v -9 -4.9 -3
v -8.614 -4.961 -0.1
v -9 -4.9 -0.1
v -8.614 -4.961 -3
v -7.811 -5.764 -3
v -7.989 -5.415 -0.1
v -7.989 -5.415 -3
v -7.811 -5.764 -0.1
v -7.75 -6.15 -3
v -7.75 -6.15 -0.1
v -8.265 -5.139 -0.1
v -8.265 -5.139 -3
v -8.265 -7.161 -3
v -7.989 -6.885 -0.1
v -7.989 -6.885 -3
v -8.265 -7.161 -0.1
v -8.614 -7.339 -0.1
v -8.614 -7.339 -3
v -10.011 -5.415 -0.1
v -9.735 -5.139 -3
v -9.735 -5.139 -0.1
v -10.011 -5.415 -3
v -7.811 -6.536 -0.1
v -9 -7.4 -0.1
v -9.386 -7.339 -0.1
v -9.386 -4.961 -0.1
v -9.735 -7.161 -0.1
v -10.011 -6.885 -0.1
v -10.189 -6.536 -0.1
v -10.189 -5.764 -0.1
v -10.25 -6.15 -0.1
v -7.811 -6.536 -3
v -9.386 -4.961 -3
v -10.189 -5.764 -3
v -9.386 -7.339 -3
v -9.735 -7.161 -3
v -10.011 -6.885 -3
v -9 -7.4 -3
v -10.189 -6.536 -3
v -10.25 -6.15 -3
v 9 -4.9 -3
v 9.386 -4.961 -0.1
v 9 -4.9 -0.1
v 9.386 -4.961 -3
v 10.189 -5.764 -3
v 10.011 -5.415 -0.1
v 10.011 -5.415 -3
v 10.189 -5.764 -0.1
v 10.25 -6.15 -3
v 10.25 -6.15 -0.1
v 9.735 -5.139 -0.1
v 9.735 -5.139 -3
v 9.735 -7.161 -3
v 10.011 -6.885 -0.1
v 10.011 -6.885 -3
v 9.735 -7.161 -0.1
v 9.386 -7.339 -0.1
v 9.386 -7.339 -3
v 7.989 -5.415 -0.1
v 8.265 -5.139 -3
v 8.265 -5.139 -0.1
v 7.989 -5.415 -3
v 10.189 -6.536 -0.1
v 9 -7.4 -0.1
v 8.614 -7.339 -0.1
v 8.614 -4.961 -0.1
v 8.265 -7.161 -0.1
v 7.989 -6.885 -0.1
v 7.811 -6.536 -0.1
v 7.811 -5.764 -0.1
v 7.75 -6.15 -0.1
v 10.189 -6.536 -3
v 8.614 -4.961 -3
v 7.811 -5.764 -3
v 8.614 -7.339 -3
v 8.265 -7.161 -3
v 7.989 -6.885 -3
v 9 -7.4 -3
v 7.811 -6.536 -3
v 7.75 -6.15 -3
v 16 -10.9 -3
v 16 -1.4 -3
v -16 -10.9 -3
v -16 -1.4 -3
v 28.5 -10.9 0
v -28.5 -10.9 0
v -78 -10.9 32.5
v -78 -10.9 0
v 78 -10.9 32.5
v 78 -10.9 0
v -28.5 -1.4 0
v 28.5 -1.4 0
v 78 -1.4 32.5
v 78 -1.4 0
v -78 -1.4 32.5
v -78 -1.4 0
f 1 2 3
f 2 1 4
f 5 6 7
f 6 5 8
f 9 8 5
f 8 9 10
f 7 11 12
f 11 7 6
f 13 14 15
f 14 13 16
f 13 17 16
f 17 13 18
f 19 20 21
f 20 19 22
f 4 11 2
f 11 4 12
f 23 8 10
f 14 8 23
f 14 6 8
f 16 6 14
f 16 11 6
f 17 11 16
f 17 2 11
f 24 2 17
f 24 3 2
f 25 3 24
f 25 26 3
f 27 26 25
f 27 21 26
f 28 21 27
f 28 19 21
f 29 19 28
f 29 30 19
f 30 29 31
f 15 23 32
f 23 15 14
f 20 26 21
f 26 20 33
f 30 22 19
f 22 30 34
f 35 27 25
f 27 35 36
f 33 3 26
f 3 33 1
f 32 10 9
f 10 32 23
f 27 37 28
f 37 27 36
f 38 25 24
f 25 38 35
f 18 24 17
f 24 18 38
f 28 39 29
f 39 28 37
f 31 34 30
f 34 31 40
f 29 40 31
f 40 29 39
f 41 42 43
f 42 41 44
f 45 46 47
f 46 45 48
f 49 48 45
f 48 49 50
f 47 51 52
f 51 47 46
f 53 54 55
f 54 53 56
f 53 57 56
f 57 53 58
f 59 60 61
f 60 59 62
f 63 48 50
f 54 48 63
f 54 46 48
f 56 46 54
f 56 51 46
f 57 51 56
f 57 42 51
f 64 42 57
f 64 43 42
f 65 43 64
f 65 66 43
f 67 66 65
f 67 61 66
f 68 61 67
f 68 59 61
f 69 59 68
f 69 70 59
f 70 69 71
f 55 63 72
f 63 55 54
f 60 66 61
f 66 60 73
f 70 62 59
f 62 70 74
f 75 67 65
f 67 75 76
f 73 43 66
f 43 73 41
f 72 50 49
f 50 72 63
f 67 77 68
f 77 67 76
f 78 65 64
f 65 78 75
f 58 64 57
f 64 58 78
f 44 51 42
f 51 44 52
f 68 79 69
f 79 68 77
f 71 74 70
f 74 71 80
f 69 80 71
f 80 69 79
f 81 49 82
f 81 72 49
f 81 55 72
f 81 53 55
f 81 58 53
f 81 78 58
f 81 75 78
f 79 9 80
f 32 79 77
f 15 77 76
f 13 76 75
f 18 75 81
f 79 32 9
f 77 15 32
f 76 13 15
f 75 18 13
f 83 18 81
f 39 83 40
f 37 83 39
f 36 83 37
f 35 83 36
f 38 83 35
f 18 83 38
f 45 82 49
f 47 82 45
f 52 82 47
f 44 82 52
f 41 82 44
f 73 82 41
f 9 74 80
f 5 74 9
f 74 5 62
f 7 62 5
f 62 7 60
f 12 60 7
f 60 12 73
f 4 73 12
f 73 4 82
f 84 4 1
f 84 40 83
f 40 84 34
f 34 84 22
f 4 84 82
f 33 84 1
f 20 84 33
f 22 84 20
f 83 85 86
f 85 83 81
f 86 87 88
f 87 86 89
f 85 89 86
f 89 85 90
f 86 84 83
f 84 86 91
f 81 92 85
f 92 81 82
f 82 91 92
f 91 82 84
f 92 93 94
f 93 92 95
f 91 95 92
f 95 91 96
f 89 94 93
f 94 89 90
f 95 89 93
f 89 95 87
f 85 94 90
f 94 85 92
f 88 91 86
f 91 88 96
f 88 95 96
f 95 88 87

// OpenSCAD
// file: smooth_model.scad
// Smoothness Parameters - Modeling
// Developed by: Michael McCool
// Copyright 2016 Intel Corporation
// License: CC-BY.  See LICENSE.md

sm_base = 5;  // base smoothness value for modeling
// file: zr300_params.scad
// Parameters for Intel(R) RealSense(TM) ZR300 Depth Camera
// Developed by: Michael McCool
// Copyright 2016 Intel Corporation
// License: CC-BY.  See LICENSE.md

// CAMERA PARAMETERS

// basic overall size of camera
zr300_x = 156;
zr300_y = 9.5;
zr300_z = 32.5;

// base of camera
zr300_base_x1 = 32;
zr300_base_x2 = 57;
zr300_base_z = 3;
zr300_base_h = 18; // separation of mounting holes
zr300_base_r = m2_5_hole_radius;

// thickness of magnetic mounting plate and tape
zr300_plate_thick = 1.4;

// CAMERA MOUNT PARAMETERS

// defaults 
zr300_mount_hole_t = 0.2;  // tolerance of mounting hole
zr300_mount_slot_t = 0.0;  // tolerance of mounting slot
// file: bolt_params.scad
// Nuts, Bolts, Spacers, Standoffs, Washers, etc.
//  For visualization only.  
//  Models are missing important details (like threads).
// Developed by: Michael McCool
// Copyright 2016 Intel Corporation
// License: CC-BY.  See LICENSE.md

// normally include the following externally, so comment out here
include <tols.scad>
include <smooth.scad>

// convenience function
function hex_size_to_radius(size) = size / (2 * cos(30));

// Smoothness

// Default colors
bolt_color = [0.5,0.5,0.7,0.9];
nut_color = [0.5,0.6,0.6,0.9];
spacer_color = [0.5,0.5,0.5,0.9];

// Radius of *unthreaded* part of the shaft (exact only for shoulder)
m2_shaft_radius   = 2/2;
m2_5_shaft_radius = 2.5/2;
m3_shaft_radius   = 3/2;
m4_shaft_radius   = 4/2;
m5_shaft_radius   = 5/2;
m6_shaft_radius   = 6/2;

// Threaded part of the shaft is slightly narrower
m2_thread_radius   = 1.86/2;
m2_5_thread_radius = 2.36/2;
m3_thread_radius   = 2.86/2;
m4_thread_radius   = 3.82/2;
m5_thread_radius   = 4.82/2;
m6_thread_radius   = 5.82/2;

// Cap radius
m2_cap_radius   = 4/2;
m2_5_cap_radius = 4.7/2;
m3_cap_radius   = 5.7/2;
m4_cap_radius   = 7.22/2;
m5_cap_radius   = 8.72/2;
m6_cap_radius   = 10.22/2;

// Cap height
m2_cap_height   = 2*m2_shaft_radius;
m2_5_cap_height = 2*m2_5_shaft_radius;
m3_cap_height   = 2*m3_shaft_radius;
m4_cap_height   = 2*m4_shaft_radius;
m5_cap_height   = 2*m5_shaft_radius;
m6_cap_height   = 2*m6_shaft_radius;

// Socket size (from hex face to hex face)
m2_socket_size   = 1.58;
m2_5_socket_size = 2.08;
m3_socket_size   = 2.58;
m4_socket_size   = 3.08;
m5_socket_size   = 4.1;
m6_socket_size   = 5.14;

// Socket radius (center to hex vertex)
m2_socket_radius   = hex_size_to_radius(m2_socket_size);
m2_5_socket_radius = hex_size_to_radius(m2_5_socket_size);
m3_socket_radius   = hex_size_to_radius(m3_socket_size);
m4_socket_radius   = hex_size_to_radius(m4_socket_size);
m5_socket_radius   = hex_size_to_radius(m5_socket_size);
m6_socket_radius   = hex_size_to_radius(m6_socket_size);

// Nut size (from hex face to hex face)
m2_nut_size   = 4;
m2_5_nut_size = 5;
m3_nut_size   = 5.5;
m4_nut_size   = 7;
m5_nut_size   = 8;
m6_nut_size   = 10;

// Nut radius (from center to hex vertex)
m2_nut_radius   = hex_size_to_radius(m2_nut_size);
m2_5_nut_radius = hex_size_to_radius(m2_5_nut_size);
m3_nut_radius   = hex_size_to_radius(m3_nut_size);
m4_nut_radius   = hex_size_to_radius(m4_nut_size);
m5_nut_radius   = hex_size_to_radius(m5_nut_size);
m6_nut_radius   = hex_size_to_radius(m6_nut_size);

// Nut height (face height for lock nuts)
m2_nut_height   = 1.6;
m2_5_nut_height = 2;
m3_nut_height   = 2.4;
m4_nut_height   = 3.2;
m5_nut_height   = 4;
m6_nut_height   = 5;

// Locknut height
m2_locknut_height   = 2.5;
m2_5_locknut_height = 3.8;
m3_locknut_height   = 4;
m4_locknut_height   = 5;
m5_locknut_height   = 5;
m6_locknut_height   = 6;

// Radius to use when cutting a hole for a given bolt size
m2_hole_radius   = m2_shaft_radius + tol/2 + cut_t;
m2_5_hole_radius = m2_5_shaft_radius + tol/2 + cut_t;
m3_hole_radius   = m3_shaft_radius + tol/2 + cut_t;
m4_hole_radius   = m4_shaft_radius + tol/2 + cut_t;
m5_hole_radius   = m5_shaft_radius + tol/2 + cut_t;
m6_hole_radius   = m6_shaft_radius + tol/2 + cut_t;

// "Standard bolt" defaults - for M3 x 10
bolt_shaft_length     = 10;
bolt_shouldere_length = 0;
bolt_shaft_radius     = m3_shaft_radius;
bolt_thread_radius    = m3_thread_radius;
bolt_shaft_sm         = 2*sm_base;
bolt_cap_radius       = m3_cap_radius;
bolt_cap_height       = m3_cap_height;
bolt_socket_size      = m3_socket_size;
bolt_socket_radius    = m3_socket_radius;

bolt_cap_sm           = 4*sm_base;
bolt_shoulder_sm      = 4*sm_base;
bolt_thread_sm        = 2*sm_base;
bolt_hole_sm          = 2*sm_base;

// "Standard nut" defaults - for M3
nut_height = m3_nut_height;
nut_size   = m3_nut_size;
nut_radius = m3_nut_radius;

// "Standard locknut" defaults - for M3
locknut_face_height = m3_nut_height;
locknut_height      = m3_locknut_height;
locknut_size        = m3_nut_size;
locknut_radius      = m3_nut_radius;

// Spacers
m2_spacer_height       = 6;
m2_spacer_hole_radius  = m2_shaft_radius + 2*tol;
m2_spacer_outer_radius = m2_nut_radius;
m2_5_spacer_height       = 6;
m2_5_spacer_hole_radius  = m2_5_shaft_radius + 2*tol;
m2_5_spacer_outer_radius = m2_5_nut_radius;
m3_spacer_height       = 6;
m3_spacer_hole_radius  = m3_shaft_radius + 2*tol;
m3_spacer_outer_radius = m3_nut_radius;
m4_spacer_height       = 6;
m4_spacer_hole_radius  = m4_shaft_radius + 2*tol;
m4_spacer_outer_radius = m4_nut_radius;
m5_spacer_height       = 6;
m5_spacer_hole_radius  = m5_shaft_radius + 2*tol;
m5_spacer_outer_radius = m5_nut_radius;
m6_spacer_height       = 6;
m6_spacer_hole_radius  = m6_shaft_radius + 2*tol;
m6_spacer_outer_radius = m6_nut_radius;

// Spacer defaults
spacer_height       = 6;
spacer_hole_radius  = m3_hole_radius + tol;
spacer_hole_sm      = 2*sm_base;
spacer_outer_radius = spacer_hole_radius + 2;
spacer_outer_sm     = 4*sm_base; 
// file: smooth.scad
// Smoothness Parameters - Default
// Developed by: Michael McCool
// Copyright 2016 Intel Corporation
// License: CC-BY.  See LICENSE.md

// include <smooth_make.scad>
include <smooth_model.scad>
// file: tols.scad
printed = 0;

// TOLERANCES 
tol = 0.1;
eps = 0.0001;

// tolerance around cuts; lasers remove a tiny slice (making holes
// very slightly larger) but 3D printers *add* material (making holes
// smaller... and typically with more "spread").
laser_cut_t = -0.05;  // typical 0.1mm cut width
printed_cut_t = 0.1;  // depends on printer; might need to be up to 0.3

// generic value depends on setting of "printed" variable
cut_t = printed ? printed_cut_t : laser_cut_t; 
// main file
// Basic Model of Intel(R) RealSense(TM) ZR300 Depth Camera
//   also includes cutting plan for basic mounting
// Developed b0y: Michael McCool
// Copyright 2016 Intel Corporation
// License: CC-BY.  See LICENSE.md
include <tols.scad>
include <smooth.scad>
include <bolt_params.scad>
include <zr300_params.scad>

// All units in mm unless noted otherwise.

mount_hole_sm = 4*sm_base;

// ZR300 Camera Model (3D)
module zr300_camera() {
  color([0.1,0.1,0.7,0.9])
  translate([-zr300_x/2,-zr300_y-zr300_plate_thick,0]) {
    cube([zr300_x,zr300_y,zr300_z]);
    difference() {
      hull() {
        translate([zr300_x/2-zr300_base_x2/2,0,0])
          cube([zr300_base_x2,zr300_y,0.1]);
        translate([zr300_x/2-zr300_base_x1/2,0,-zr300_base_z])
          cube([zr300_base_x1,zr300_y,0.1]);
      }
      translate([0,zr300_y/2,-zr300_base_z-0.1]) {
        translate([zr300_x/2-zr300_base_h/2,0,0])
          cylinder(r=zr300_base_r,h=zr300_base_z,$fn=mount_hole_sm);
        translate([zr300_x/2+zr300_base_h/2,0,0])
          cylinder(r=zr300_base_r,h=zr300_base_z,$fn=mount_hole_sm);
      }
    }
  }
}

// ZR300 Camera Mount Slot (2D)
module zr300_camera_mounting_holes(
  hole_t = zr300_mount_hole_t,
  slot_t = zr300_mount_slot_t
) {
}

// VISUALIZATION
zr300_camera();
translate([0,zr300_y+3.5,0])
  rotate([90,0,0])
    linear_extrude(3)
      zr300_camera_mounting_holes();
